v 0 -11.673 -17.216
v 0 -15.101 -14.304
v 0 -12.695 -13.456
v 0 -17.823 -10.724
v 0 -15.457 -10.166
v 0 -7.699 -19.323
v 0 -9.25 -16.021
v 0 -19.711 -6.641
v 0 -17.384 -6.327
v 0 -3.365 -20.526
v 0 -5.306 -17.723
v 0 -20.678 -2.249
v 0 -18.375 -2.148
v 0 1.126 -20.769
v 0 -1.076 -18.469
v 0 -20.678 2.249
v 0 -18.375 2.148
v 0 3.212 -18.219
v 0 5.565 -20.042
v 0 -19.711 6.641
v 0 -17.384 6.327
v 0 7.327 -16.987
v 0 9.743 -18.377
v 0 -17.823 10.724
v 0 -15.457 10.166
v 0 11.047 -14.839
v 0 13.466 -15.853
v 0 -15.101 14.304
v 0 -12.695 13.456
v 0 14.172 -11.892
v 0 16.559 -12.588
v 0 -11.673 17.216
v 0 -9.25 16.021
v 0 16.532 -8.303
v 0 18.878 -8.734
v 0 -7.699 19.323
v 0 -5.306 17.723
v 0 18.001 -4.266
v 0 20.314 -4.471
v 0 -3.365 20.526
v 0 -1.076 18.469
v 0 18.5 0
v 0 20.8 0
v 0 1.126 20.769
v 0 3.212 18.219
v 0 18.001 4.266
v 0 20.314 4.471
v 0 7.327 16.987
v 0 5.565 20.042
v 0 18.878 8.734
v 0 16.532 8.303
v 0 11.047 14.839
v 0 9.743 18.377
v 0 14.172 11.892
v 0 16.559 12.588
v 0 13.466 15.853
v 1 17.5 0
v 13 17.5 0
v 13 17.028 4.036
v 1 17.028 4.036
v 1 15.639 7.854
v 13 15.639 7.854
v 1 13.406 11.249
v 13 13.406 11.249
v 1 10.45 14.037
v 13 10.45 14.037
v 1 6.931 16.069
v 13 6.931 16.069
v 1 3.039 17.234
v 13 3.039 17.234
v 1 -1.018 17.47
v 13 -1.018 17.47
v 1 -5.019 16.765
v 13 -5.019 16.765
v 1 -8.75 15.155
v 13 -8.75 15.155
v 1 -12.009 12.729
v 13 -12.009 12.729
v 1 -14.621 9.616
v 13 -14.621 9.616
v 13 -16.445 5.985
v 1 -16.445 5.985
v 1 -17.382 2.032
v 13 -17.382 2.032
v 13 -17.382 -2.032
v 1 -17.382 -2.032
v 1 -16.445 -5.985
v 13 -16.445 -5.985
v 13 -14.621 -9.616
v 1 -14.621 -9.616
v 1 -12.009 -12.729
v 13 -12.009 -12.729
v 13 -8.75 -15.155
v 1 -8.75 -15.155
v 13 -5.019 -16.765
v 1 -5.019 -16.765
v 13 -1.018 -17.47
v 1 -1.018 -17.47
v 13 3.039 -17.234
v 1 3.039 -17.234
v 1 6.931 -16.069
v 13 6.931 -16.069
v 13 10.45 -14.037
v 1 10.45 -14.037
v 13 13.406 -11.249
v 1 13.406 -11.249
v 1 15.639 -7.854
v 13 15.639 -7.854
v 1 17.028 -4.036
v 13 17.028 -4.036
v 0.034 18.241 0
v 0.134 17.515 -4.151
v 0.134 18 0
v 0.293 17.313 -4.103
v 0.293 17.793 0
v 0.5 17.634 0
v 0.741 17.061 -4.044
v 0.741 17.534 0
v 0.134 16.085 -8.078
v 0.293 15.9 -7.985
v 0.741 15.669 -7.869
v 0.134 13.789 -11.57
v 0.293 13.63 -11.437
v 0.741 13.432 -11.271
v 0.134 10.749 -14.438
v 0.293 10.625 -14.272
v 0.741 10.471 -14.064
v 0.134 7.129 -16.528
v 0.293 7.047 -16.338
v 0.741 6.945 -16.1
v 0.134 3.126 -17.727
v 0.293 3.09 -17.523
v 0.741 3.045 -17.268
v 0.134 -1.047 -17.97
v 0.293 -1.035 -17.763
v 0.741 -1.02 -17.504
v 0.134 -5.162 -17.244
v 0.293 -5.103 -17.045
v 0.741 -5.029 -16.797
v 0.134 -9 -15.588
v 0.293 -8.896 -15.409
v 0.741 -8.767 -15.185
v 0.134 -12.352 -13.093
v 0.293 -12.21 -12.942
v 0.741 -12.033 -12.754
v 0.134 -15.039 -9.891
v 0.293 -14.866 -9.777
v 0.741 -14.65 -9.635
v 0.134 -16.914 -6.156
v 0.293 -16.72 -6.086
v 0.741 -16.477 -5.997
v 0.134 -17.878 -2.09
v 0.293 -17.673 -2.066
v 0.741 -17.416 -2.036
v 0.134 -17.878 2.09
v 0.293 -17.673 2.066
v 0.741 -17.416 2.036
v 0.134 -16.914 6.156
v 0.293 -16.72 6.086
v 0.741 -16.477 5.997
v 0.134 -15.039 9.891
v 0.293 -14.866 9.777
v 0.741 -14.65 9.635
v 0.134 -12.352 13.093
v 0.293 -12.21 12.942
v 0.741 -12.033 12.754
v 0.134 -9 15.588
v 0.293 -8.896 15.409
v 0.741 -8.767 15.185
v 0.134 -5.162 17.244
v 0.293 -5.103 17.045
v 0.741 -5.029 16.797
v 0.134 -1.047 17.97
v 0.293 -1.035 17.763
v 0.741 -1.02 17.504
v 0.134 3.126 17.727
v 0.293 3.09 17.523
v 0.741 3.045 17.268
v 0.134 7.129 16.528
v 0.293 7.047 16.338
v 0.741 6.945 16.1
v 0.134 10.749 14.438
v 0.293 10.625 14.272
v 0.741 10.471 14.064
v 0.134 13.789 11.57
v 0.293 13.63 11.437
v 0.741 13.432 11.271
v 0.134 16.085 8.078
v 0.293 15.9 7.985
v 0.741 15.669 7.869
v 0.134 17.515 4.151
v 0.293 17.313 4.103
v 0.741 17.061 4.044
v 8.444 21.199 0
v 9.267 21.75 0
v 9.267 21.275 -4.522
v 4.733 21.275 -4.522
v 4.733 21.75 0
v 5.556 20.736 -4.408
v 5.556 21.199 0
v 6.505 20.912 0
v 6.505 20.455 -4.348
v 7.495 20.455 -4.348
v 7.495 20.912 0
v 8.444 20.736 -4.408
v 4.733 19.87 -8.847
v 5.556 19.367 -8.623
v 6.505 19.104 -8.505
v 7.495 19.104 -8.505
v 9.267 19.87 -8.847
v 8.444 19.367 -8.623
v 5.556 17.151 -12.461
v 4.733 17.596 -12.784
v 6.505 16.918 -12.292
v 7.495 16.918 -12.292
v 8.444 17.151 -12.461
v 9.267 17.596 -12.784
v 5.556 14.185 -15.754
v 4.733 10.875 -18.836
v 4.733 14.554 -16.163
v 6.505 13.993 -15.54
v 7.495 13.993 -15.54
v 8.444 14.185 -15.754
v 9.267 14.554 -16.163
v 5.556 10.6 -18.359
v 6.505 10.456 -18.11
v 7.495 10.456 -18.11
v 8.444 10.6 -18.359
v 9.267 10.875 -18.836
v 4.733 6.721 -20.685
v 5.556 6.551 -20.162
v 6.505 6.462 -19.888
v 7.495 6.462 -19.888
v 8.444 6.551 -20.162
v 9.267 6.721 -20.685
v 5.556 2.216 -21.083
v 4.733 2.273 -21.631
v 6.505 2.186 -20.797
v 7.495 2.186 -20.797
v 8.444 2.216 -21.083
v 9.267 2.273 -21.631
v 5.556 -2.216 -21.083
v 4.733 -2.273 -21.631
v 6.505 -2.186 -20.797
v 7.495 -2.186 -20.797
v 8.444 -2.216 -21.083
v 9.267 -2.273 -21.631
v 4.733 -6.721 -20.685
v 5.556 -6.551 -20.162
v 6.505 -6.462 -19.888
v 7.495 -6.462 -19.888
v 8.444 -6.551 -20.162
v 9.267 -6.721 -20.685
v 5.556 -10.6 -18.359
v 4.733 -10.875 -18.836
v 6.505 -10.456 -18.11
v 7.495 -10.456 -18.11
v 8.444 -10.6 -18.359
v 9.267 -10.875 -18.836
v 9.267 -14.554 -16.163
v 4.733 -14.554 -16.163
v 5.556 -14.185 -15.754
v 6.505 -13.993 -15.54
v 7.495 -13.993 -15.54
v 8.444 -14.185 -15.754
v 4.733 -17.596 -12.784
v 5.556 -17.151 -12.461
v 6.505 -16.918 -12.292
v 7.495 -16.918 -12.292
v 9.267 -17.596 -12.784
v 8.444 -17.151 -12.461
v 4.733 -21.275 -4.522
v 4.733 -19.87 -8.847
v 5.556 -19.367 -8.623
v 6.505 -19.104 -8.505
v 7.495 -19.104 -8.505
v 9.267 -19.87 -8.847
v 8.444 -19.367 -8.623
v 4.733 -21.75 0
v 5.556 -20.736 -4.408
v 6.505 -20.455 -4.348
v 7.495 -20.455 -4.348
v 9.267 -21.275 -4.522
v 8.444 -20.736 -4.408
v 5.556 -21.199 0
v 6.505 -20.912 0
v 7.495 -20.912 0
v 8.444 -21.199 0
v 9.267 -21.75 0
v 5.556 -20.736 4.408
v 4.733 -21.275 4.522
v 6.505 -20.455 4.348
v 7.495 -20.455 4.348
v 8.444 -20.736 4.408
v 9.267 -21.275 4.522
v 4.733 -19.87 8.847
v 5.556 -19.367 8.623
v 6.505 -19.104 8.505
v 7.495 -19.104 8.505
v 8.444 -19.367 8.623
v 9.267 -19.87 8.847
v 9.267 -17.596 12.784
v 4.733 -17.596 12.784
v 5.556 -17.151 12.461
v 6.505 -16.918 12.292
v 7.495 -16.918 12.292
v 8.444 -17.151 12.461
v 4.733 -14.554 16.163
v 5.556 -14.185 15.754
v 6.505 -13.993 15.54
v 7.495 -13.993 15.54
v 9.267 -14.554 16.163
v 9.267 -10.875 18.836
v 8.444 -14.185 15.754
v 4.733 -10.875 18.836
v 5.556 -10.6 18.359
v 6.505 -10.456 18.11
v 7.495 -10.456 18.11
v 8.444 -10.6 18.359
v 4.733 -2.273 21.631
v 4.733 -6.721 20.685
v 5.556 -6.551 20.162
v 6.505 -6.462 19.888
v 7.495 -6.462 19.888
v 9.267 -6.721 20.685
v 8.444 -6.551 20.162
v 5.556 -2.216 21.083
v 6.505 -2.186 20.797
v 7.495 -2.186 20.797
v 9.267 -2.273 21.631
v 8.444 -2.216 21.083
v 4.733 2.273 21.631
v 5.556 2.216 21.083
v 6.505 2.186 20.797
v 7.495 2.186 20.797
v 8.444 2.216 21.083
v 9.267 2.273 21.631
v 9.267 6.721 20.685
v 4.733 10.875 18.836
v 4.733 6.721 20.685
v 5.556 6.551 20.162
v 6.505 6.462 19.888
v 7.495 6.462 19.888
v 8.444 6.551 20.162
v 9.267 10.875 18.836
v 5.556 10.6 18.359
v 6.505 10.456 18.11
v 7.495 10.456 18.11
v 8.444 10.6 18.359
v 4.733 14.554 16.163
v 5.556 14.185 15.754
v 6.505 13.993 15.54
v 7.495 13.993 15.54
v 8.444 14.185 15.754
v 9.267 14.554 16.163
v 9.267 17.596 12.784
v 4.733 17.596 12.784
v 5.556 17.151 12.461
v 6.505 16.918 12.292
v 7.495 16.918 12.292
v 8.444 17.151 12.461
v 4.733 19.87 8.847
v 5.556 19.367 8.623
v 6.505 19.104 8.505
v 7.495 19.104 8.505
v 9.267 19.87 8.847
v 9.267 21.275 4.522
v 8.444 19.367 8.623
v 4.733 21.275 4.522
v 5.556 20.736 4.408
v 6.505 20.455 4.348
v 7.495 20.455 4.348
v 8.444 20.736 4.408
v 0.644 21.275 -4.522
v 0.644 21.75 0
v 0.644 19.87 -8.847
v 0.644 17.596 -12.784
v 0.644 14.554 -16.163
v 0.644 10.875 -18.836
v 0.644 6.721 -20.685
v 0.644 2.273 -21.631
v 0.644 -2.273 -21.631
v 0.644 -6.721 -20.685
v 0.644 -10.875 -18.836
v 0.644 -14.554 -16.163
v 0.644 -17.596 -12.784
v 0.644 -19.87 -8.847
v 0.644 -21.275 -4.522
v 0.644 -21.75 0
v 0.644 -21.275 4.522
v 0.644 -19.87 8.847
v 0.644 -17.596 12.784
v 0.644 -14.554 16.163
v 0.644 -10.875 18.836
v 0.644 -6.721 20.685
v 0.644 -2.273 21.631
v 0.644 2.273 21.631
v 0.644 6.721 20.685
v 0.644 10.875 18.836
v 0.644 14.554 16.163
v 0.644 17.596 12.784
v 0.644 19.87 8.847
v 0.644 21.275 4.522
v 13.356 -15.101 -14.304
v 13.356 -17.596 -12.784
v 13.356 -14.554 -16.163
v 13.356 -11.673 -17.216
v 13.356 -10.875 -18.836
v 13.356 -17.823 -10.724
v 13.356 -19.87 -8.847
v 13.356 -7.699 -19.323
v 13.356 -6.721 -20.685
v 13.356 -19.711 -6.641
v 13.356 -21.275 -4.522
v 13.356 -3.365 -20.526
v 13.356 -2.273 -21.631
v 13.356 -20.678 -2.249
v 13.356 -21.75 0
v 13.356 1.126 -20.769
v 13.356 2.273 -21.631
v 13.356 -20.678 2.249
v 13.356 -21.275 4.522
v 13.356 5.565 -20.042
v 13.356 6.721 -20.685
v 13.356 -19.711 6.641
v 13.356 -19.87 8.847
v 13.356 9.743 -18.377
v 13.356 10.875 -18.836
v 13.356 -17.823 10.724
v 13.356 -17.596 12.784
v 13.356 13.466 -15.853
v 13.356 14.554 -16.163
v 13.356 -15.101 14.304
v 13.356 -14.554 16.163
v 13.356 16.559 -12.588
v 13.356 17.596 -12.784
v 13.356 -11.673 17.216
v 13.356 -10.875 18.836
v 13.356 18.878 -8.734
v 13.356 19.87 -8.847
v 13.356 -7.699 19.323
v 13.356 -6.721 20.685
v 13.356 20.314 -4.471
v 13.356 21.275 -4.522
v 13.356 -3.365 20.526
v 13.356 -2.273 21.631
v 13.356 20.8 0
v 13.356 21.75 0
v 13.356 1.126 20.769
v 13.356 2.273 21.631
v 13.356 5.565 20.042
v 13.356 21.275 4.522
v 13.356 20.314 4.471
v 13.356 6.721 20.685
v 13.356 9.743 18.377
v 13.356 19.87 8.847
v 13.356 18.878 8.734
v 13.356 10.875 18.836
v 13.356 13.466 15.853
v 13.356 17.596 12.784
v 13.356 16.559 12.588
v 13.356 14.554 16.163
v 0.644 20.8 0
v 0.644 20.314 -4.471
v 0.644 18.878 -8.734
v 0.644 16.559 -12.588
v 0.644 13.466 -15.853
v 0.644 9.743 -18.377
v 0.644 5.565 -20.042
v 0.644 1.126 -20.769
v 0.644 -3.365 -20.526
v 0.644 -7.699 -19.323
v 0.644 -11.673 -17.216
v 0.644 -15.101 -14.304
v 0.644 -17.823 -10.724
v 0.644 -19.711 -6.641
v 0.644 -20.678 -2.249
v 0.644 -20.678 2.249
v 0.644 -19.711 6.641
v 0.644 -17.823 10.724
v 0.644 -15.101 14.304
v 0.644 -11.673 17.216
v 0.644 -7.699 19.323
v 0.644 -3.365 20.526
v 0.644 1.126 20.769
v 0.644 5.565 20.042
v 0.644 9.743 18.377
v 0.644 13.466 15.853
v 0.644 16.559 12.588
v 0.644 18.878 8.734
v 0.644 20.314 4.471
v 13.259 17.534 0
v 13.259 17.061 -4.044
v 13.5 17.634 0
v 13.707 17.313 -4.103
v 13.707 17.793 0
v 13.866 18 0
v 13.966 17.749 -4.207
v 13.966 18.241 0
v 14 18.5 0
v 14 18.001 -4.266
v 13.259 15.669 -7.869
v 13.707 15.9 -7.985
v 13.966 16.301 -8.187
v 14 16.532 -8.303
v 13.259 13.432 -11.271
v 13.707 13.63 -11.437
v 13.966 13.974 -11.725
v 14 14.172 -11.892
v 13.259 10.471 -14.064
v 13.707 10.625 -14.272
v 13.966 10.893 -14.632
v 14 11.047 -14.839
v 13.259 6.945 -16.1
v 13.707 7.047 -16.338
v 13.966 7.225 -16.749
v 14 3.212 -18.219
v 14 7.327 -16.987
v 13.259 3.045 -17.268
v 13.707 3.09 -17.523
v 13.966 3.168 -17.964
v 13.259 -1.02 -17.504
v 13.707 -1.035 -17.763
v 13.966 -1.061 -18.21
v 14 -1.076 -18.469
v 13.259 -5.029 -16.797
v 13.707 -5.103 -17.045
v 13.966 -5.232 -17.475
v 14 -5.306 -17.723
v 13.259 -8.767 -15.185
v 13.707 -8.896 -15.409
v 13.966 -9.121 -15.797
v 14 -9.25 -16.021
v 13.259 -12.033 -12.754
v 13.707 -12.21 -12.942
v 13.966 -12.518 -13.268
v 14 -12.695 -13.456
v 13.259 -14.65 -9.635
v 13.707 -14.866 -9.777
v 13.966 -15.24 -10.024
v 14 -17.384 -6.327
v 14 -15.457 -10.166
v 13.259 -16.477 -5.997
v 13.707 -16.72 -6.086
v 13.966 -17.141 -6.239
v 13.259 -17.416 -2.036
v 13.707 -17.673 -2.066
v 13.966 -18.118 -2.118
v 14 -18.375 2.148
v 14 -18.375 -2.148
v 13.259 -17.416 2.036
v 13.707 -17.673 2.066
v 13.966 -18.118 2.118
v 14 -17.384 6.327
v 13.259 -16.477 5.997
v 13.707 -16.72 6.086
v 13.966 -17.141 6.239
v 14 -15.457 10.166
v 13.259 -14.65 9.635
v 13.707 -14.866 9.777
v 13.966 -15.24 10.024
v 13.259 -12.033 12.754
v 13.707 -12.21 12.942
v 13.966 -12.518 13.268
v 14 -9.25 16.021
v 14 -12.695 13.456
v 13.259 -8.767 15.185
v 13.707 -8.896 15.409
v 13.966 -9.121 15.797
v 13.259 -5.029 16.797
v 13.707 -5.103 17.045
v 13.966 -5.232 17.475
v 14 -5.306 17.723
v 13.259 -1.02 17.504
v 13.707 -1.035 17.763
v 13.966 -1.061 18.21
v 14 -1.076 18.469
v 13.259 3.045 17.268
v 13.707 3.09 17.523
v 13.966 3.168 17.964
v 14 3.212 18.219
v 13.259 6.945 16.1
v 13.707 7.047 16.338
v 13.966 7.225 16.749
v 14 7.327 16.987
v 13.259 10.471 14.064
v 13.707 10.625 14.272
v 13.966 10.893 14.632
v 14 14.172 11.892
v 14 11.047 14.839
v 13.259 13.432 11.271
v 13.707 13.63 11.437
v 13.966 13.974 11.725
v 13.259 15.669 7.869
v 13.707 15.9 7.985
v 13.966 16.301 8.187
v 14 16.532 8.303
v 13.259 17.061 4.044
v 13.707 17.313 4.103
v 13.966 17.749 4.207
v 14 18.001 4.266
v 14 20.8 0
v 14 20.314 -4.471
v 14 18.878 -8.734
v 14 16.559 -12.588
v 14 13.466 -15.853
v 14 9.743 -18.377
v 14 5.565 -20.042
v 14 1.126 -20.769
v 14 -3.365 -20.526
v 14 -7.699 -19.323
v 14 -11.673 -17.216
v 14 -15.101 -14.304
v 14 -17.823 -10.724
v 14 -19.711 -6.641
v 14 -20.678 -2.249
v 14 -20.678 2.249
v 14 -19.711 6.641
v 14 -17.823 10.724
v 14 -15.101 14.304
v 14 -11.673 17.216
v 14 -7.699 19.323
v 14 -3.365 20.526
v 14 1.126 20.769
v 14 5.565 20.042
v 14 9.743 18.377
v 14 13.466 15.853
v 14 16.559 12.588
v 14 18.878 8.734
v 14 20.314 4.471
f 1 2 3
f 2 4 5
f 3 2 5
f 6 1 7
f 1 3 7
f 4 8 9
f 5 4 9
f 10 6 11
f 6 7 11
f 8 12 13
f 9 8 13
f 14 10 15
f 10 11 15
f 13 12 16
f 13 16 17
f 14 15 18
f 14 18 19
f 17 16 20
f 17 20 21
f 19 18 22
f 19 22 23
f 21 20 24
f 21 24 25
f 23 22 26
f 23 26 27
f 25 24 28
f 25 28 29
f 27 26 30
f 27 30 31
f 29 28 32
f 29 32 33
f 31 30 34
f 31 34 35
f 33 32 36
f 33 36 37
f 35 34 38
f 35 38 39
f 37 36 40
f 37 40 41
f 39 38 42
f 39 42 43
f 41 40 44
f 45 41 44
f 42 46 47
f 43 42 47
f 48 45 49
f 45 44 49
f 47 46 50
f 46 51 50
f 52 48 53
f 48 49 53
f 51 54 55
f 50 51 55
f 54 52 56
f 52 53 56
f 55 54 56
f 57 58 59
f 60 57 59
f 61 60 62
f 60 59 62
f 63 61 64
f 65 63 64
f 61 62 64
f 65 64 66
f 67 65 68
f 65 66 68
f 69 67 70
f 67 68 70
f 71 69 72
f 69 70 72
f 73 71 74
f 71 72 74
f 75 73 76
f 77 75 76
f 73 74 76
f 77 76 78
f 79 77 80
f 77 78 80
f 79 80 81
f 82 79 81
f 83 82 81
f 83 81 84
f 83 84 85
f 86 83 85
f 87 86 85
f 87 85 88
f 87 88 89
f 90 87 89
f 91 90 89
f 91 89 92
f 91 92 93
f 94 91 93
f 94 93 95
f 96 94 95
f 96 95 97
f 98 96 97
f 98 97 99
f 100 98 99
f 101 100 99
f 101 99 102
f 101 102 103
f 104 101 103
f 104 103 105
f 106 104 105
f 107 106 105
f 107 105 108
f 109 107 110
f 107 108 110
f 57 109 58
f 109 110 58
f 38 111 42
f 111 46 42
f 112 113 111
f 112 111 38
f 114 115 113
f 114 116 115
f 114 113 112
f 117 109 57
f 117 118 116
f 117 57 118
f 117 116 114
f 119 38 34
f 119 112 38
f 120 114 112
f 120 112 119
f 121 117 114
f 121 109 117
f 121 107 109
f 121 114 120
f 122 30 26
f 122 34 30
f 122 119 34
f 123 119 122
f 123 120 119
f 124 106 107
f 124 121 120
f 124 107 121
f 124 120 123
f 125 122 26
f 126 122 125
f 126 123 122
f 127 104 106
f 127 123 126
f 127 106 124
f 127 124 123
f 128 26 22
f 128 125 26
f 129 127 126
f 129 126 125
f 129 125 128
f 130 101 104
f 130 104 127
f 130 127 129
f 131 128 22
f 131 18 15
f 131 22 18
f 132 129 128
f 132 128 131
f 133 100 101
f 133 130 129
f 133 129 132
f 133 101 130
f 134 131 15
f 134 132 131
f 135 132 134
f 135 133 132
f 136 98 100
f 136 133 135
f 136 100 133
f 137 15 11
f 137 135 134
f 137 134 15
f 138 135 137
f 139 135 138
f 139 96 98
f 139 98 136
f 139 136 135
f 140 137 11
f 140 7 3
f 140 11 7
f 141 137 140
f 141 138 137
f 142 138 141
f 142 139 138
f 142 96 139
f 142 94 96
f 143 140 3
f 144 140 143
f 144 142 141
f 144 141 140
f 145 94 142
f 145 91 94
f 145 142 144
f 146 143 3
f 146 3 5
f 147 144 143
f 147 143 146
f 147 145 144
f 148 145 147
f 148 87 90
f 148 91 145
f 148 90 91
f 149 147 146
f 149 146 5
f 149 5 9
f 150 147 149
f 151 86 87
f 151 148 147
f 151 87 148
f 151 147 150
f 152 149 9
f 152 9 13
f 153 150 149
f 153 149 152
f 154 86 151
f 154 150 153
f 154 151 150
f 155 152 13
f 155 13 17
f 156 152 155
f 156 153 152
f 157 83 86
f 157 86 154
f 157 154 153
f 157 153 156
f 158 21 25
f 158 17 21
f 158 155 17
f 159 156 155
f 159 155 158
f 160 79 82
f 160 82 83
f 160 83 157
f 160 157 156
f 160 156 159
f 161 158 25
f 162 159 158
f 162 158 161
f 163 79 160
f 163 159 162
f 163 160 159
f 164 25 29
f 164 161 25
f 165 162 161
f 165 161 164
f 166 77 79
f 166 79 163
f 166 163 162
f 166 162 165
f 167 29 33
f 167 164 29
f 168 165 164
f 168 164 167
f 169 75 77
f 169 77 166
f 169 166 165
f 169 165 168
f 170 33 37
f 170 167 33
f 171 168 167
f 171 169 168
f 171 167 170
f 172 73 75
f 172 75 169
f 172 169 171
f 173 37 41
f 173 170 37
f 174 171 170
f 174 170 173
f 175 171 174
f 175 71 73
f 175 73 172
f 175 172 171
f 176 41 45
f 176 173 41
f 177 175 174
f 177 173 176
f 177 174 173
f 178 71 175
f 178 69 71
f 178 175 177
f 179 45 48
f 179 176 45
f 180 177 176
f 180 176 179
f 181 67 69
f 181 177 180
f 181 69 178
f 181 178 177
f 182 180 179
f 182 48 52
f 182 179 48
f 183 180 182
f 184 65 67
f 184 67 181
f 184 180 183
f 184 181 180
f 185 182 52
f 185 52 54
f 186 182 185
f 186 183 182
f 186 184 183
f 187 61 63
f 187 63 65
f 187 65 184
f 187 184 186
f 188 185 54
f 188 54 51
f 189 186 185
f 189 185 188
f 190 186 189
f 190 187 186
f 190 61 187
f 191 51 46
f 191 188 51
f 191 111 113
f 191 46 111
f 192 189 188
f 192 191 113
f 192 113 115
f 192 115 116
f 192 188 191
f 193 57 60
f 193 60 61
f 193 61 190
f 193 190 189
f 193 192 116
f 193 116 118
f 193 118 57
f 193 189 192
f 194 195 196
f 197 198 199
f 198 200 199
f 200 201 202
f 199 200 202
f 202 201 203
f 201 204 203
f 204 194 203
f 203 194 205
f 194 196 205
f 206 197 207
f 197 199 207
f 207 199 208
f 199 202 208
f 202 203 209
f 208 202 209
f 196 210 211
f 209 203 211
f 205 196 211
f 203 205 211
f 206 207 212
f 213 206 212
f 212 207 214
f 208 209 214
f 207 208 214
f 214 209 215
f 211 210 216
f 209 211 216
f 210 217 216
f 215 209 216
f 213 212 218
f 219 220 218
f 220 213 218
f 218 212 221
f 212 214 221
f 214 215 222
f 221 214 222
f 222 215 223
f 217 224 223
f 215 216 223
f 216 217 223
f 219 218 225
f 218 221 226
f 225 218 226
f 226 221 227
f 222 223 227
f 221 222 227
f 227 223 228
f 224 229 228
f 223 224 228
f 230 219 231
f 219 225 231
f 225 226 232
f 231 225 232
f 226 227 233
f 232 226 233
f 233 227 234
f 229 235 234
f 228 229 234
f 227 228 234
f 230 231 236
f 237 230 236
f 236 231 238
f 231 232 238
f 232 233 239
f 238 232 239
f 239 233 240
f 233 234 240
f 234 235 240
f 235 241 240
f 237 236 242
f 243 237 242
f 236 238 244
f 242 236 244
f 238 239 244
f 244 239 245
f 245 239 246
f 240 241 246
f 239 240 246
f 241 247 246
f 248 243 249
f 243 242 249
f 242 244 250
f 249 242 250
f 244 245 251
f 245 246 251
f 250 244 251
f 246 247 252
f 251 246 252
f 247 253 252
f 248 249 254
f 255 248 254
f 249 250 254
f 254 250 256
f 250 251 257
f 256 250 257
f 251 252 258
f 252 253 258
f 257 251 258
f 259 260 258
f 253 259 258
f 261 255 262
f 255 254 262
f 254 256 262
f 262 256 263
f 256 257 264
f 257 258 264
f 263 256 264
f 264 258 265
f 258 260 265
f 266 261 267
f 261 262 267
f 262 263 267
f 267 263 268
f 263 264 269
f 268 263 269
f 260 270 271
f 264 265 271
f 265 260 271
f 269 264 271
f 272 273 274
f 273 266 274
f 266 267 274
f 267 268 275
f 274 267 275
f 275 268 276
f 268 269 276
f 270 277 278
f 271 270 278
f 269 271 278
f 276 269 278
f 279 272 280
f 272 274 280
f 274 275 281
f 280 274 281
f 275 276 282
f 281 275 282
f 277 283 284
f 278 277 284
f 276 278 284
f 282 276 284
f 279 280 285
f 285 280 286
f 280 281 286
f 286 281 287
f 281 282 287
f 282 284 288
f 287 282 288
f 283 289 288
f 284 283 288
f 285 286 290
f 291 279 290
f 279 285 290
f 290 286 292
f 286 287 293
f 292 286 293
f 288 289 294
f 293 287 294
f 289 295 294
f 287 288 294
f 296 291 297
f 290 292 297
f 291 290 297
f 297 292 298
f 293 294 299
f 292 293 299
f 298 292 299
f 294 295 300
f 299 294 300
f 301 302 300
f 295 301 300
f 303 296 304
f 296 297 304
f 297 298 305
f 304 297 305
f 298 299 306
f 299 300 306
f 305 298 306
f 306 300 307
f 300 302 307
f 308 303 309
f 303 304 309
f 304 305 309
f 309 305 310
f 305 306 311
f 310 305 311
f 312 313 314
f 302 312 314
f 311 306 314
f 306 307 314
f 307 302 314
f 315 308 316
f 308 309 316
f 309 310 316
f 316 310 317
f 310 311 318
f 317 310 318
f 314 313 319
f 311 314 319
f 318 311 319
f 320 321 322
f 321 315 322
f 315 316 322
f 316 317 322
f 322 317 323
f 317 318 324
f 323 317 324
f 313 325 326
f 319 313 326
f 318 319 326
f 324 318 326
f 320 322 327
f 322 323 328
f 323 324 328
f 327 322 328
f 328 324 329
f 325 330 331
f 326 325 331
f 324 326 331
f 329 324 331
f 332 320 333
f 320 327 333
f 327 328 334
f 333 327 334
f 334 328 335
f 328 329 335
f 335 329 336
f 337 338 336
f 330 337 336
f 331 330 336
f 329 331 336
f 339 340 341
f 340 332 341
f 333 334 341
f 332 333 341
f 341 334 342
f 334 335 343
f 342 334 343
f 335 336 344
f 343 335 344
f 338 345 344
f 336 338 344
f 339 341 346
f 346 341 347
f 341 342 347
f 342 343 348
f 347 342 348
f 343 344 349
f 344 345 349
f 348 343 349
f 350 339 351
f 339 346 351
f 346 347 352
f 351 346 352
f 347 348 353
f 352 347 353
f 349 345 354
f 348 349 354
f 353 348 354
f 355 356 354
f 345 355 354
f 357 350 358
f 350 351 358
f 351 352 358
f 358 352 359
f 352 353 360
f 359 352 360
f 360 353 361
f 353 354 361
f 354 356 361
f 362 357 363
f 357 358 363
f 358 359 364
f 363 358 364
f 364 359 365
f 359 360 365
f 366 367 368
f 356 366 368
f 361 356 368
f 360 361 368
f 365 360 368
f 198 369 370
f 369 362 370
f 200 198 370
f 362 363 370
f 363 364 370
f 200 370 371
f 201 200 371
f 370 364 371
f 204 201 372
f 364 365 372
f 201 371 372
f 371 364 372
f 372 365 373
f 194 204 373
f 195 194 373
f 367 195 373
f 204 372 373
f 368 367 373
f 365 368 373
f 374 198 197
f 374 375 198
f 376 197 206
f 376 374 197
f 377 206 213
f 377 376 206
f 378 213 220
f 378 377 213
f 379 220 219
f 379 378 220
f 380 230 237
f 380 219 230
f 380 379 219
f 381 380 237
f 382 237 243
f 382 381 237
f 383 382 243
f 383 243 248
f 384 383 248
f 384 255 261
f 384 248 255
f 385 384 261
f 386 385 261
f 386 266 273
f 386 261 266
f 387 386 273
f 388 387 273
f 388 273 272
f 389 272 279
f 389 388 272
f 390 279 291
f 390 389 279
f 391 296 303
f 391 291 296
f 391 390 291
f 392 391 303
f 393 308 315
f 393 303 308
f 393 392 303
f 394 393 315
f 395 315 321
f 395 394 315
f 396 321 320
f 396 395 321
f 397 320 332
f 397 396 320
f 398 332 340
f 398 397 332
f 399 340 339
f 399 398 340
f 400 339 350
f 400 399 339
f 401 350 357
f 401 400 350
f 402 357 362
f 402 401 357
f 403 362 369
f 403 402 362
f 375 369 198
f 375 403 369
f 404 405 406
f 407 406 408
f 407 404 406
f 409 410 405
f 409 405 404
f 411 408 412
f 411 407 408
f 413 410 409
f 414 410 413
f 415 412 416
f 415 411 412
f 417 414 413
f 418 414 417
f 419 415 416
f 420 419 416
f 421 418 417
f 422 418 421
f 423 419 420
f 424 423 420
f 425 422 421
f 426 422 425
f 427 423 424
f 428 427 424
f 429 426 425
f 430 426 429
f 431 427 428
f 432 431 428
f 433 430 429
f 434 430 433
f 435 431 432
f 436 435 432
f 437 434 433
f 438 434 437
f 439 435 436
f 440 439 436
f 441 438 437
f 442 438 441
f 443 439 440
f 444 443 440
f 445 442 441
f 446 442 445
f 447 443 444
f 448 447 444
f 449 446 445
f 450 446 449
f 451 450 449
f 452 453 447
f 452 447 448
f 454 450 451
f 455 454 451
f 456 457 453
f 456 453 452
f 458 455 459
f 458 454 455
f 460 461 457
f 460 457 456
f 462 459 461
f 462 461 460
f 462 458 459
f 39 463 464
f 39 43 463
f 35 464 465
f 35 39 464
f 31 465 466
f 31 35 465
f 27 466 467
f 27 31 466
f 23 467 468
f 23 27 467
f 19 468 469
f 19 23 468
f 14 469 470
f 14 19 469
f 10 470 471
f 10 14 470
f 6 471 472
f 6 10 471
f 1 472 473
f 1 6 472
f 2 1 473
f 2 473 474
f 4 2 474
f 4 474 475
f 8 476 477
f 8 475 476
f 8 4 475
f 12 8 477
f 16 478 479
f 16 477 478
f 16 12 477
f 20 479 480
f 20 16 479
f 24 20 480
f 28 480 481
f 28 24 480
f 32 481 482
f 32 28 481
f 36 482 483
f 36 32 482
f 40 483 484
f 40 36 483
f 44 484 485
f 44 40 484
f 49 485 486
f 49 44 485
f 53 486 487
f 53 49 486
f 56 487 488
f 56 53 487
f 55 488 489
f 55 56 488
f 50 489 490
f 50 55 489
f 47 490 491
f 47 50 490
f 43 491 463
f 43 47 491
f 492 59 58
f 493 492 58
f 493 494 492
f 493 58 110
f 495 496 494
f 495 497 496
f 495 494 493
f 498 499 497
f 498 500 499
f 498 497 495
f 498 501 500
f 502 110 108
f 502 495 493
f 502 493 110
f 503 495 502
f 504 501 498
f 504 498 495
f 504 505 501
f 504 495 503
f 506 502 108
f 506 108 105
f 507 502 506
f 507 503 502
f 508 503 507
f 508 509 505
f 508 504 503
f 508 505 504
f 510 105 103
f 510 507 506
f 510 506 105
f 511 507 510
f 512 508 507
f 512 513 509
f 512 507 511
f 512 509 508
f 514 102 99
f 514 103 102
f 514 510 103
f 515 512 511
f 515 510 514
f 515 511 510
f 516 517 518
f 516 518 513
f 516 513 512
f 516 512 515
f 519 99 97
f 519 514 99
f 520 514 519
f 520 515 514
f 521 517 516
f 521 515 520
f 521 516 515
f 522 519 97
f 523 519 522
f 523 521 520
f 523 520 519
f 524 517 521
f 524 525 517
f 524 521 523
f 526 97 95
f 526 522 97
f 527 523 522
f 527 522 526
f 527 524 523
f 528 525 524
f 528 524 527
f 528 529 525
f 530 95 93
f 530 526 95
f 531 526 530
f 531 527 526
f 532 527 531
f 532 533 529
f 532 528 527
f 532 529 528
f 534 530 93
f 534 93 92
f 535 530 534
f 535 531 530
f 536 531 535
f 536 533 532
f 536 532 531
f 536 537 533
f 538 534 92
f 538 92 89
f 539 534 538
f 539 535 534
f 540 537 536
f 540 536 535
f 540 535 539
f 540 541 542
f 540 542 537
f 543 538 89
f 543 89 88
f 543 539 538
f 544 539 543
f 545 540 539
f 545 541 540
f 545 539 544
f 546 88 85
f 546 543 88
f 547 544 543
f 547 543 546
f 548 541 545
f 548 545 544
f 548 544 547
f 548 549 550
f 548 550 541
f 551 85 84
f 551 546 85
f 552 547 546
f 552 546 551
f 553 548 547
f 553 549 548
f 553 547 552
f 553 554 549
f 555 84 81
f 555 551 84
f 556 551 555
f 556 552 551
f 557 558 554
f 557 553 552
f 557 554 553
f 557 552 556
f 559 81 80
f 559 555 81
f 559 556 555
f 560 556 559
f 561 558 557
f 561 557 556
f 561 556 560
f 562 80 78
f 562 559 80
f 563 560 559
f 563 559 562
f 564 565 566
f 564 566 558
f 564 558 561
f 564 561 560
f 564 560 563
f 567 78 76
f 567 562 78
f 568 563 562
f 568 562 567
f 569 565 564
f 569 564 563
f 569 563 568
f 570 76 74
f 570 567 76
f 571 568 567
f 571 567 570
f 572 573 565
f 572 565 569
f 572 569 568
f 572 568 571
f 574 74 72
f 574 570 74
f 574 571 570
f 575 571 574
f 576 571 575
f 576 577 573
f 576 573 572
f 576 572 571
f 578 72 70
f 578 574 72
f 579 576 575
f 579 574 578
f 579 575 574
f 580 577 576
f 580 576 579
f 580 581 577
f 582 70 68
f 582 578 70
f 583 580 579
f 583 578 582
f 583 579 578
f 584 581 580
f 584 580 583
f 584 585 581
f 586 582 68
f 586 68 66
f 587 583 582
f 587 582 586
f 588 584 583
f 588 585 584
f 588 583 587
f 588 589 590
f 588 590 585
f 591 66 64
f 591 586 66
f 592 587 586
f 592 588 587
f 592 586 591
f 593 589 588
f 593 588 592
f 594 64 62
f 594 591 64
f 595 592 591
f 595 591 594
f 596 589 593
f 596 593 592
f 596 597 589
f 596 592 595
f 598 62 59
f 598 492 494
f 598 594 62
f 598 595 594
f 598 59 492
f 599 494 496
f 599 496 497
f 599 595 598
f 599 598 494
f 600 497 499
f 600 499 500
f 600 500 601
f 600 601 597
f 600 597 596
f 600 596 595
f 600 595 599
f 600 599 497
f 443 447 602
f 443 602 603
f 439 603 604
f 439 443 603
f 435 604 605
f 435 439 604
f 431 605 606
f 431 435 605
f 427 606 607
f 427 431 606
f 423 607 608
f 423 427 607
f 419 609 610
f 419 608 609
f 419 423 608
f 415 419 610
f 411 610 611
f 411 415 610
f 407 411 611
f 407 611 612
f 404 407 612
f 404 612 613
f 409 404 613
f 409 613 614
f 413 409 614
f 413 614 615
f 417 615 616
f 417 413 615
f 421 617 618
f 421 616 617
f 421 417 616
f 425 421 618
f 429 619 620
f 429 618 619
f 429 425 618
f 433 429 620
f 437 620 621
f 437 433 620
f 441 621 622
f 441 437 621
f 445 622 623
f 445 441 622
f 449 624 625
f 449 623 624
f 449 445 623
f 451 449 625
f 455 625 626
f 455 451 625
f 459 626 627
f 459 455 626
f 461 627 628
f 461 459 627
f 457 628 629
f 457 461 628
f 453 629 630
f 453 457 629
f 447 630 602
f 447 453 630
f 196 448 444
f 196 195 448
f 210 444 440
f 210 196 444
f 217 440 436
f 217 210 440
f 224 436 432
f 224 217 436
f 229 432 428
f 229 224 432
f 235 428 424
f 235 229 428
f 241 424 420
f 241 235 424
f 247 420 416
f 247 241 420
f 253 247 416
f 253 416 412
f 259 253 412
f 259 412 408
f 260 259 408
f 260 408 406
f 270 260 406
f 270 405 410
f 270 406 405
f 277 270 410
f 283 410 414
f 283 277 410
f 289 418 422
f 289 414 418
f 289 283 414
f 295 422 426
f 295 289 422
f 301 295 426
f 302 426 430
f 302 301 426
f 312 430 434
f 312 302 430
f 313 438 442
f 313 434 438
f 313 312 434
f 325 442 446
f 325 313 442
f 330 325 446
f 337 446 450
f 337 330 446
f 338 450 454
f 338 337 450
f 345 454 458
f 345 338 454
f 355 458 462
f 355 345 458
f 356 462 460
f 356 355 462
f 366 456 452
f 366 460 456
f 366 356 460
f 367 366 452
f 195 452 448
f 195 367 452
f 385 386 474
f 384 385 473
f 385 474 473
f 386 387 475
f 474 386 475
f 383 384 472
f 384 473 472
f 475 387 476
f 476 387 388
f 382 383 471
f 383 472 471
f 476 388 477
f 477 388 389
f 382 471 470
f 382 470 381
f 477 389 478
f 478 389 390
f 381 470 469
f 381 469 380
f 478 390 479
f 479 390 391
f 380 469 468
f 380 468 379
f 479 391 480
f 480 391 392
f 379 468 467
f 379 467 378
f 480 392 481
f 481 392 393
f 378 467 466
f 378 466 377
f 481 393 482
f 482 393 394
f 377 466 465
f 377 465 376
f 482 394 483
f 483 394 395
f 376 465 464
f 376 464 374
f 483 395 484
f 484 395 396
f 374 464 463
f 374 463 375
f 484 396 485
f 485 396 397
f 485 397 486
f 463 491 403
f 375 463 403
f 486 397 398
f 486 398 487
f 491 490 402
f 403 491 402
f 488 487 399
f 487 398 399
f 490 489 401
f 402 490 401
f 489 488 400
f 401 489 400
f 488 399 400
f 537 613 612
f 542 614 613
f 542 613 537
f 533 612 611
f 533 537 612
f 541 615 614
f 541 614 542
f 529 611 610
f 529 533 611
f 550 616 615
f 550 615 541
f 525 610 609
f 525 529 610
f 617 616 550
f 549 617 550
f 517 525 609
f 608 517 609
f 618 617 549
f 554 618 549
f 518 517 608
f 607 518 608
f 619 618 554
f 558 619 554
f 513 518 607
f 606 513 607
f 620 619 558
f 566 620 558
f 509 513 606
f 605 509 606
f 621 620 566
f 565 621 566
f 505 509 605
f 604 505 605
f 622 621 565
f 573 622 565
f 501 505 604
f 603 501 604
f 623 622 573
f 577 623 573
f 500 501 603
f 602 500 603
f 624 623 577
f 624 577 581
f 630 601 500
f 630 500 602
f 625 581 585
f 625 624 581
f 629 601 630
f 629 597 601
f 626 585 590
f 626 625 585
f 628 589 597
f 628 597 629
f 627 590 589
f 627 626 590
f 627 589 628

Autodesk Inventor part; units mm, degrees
sketch "Sketch_1" plane through (0, 0, 0) normal (0, 0, 1) x (1, 0, 0)
  line L0 (14, 0) -> (0, 0)
  arc A0 (0, 18.5) -> (1, 17.5) centre (1, 18.5) ccw
  line L1 (1, 17.5) -> (13, 17.5)
  arc A1 (13, 17.5) -> (14, 18.5) centre (13, 18.5) ccw
  line L2 (14, 18.5) -> (14, 20.8)
  line L3 (14, 20.8) -> (13.356, 20.8)
  line L4 (13.356, 20.8) -> (13.356, 21.75)
  line L5 (13.356, 21.75) -> (9.2673, 21.75)
  arc A2 (4.7327, 21.75) -> (9.2673, 21.75) centre (7, 24.25) ccw
  line L6 (4.7327, 21.75) -> (0.644, 21.75)
  line L7 (0.644, 21.75) -> (0.644, 20.8)
  line L8 (0.644, 20.8) -> (0, 20.8)
  line L9 (0, 20.8) -> (0, 18.5)
revolve "Revolution1" add sketch "Sketch_1" angle 360 about axis through (14, 0, 0) along (1, 0, 0)
ref_plane "ip_cst_3_ir_1_1_XY" through (7, 24.25, 0) normal (-1, 0, 0) x (0, 0, -1)
ref_plane "ip_cst_3_ir_1_1_YZ" through (7, 24.25, 0) normal (0, 0, -1) x (0, -1, 0)
ref_plane "ip_cst_3_ir_1_1_ZX" through (7, 24.25, 0) normal (0, -1, 0) x (-1, 0, 0)
ref_plane "ip_cst_3_ir_1_10_XY" through (7, -8.5992, -22.6741) normal (-1, 0, 0) x (0, 0, -1)
ref_plane "ip_cst_3_ir_1_10_YZ" through (7, -8.5992, -22.6741) normal (0, 0, -1) x (0, -1, 0)
ref_plane "ip_cst_3_ir_1_10_ZX" through (7, -8.5992, -22.6741) normal (0, -1, 0) x (-1, 0, 0)
ref_plane "ip_cst_3_ir_1_11_XY" through (7, 2.923, -24.0732) normal (-1, 0, 0) x (0, 0, -1)
ref_plane "ip_cst_3_ir_1_11_YZ" through (7, 2.923, -24.0732) normal (0, 0, -1) x (0, -1, 0)
ref_plane "ip_cst_3_ir_1_11_ZX" through (7, 2.923, -24.0732) normal (0, -1, 0) x (-1, 0, 0)
ref_plane "ip_cst_3_ir_1_12_XY" through (7, 13.7756, -19.9574) normal (-1, 0, 0) x (0, 0, -1)
ref_plane "ip_cst_3_ir_1_12_YZ" through (7, 13.7756, -19.9574) normal (0, 0, -1) x (0, -1, 0)
ref_plane "ip_cst_3_ir_1_12_ZX" through (7, 13.7756, -19.9574) normal (0, -1, 0) x (-1, 0, 0)
ref_plane "ip_cst_3_ir_1_13_XY" through (7, 21.4723, -11.2695) normal (-1, 0, 0) x (0, 0, -1)
ref_plane "ip_cst_3_ir_1_13_YZ" through (7, 21.4723, -11.2695) normal (0, 0, -1) x (0, -1, 0)
ref_plane "ip_cst_3_ir_1_13_ZX" through (7, 21.4723, -11.2695) normal (0, -1, 0) x (-1, 0, 0)
ref_plane "ip_cst_3_ir_1_2_XY" through (7, 21.4723, 11.2695) normal (-1, 0, 0) x (0, 0, -1)
ref_plane "ip_cst_3_ir_1_2_YZ" through (7, 21.4723, 11.2695) normal (0, 0, -1) x (0, -1, 0)
ref_plane "ip_cst_3_ir_1_2_ZX" through (7, 21.4723, 11.2695) normal (0, -1, 0) x (-1, 0, 0)
ref_plane "ip_cst_3_ir_1_3_XY" through (7, 13.7756, 19.9574) normal (-1, 0, 0) x (0, 0, -1)
ref_plane "ip_cst_3_ir_1_3_YZ" through (7, 13.7756, 19.9574) normal (0, 0, -1) x (0, -1, 0)
ref_plane "ip_cst_3_ir_1_3_ZX" through (7, 13.7756, 19.9574) normal (0, -1, 0) x (-1, 0, 0)
ref_plane "ip_cst_3_ir_1_4_XY" through (7, 2.923, 24.0732) normal (-1, 0, 0) x (0, 0, -1)
ref_plane "ip_cst_3_ir_1_4_YZ" through (7, 2.923, 24.0732) normal (0, 0, -1) x (0, -1, 0)
ref_plane "ip_cst_3_ir_1_4_ZX" through (7, 2.923, 24.0732) normal (0, -1, 0) x (-1, 0, 0)
ref_plane "ip_cst_3_ir_1_5_XY" through (7, -8.5992, 22.6741) normal (-1, 0, 0) x (0, 0, -1)
ref_plane "ip_cst_3_ir_1_5_YZ" through (7, -8.5992, 22.6741) normal (0, 0, -1) x (0, -1, 0)
ref_plane "ip_cst_3_ir_1_5_ZX" through (7, -8.5992, 22.6741) normal (0, -1, 0) x (-1, 0, 0)
ref_plane "ip_cst_3_ir_1_6_XY" through (7, -18.1514, 16.0807) normal (-1, 0, 0) x (0, 0, -1)
ref_plane "ip_cst_3_ir_1_6_YZ" through (7, -18.1514, 16.0807) normal (0, 0, -1) x (0, -1, 0)
ref_plane "ip_cst_3_ir_1_6_ZX" through (7, -18.1514, 16.0807) normal (0, -1, 0) x (-1, 0, 0)
ref_plane "ip_cst_3_ir_1_7_XY" through (7, -23.5453, 5.8034) normal (-1, 0, 0) x (0, 0, -1)
ref_plane "ip_cst_3_ir_1_7_YZ" through (7, -23.5453, 5.8034) normal (0, 0, -1) x (0, -1, 0)
ref_plane "ip_cst_3_ir_1_7_ZX" through (7, -23.5453, 5.8034) normal (0, -1, 0) x (-1, 0, 0)
ref_plane "ip_cst_3_ir_1_8_XY" through (7, -23.5453, -5.8034) normal (-1, 0, 0) x (0, 0, -1)
ref_plane "ip_cst_3_ir_1_8_YZ" through (7, -23.5453, -5.8034) normal (0, 0, -1) x (0, -1, 0)
ref_plane "ip_cst_3_ir_1_8_ZX" through (7, -23.5453, -5.8034) normal (0, -1, 0) x (-1, 0, 0)
ref_plane "ip_cst_3_ir_1_9_XY" through (7, -18.1514, -16.0807) normal (-1, 0, 0) x (0, 0, -1)
ref_plane "ip_cst_3_ir_1_9_YZ" through (7, -18.1514, -16.0807) normal (0, 0, -1) x (0, -1, 0)
ref_plane "ip_cst_3_ir_1_9_ZX" through (7, -18.1514, -16.0807) normal (0, -1, 0) x (-1, 0, 0)
ref_plane "ip_cst_3_ir_1a_XY" through (0, 0, 0) normal (1, 0, 0) x (0, 0, -1)
ref_plane "ip_cst_3_ir_1a_YZ" through (0, 0, 0) normal (0, 0, -1) x (0, 1, 0)
ref_plane "ip_cst_3_ir_1a_ZX" through (0, 0, 0) normal (0, 1, 0) x (1, 0, 0)
properties part number "6007DDU Inner ring"
